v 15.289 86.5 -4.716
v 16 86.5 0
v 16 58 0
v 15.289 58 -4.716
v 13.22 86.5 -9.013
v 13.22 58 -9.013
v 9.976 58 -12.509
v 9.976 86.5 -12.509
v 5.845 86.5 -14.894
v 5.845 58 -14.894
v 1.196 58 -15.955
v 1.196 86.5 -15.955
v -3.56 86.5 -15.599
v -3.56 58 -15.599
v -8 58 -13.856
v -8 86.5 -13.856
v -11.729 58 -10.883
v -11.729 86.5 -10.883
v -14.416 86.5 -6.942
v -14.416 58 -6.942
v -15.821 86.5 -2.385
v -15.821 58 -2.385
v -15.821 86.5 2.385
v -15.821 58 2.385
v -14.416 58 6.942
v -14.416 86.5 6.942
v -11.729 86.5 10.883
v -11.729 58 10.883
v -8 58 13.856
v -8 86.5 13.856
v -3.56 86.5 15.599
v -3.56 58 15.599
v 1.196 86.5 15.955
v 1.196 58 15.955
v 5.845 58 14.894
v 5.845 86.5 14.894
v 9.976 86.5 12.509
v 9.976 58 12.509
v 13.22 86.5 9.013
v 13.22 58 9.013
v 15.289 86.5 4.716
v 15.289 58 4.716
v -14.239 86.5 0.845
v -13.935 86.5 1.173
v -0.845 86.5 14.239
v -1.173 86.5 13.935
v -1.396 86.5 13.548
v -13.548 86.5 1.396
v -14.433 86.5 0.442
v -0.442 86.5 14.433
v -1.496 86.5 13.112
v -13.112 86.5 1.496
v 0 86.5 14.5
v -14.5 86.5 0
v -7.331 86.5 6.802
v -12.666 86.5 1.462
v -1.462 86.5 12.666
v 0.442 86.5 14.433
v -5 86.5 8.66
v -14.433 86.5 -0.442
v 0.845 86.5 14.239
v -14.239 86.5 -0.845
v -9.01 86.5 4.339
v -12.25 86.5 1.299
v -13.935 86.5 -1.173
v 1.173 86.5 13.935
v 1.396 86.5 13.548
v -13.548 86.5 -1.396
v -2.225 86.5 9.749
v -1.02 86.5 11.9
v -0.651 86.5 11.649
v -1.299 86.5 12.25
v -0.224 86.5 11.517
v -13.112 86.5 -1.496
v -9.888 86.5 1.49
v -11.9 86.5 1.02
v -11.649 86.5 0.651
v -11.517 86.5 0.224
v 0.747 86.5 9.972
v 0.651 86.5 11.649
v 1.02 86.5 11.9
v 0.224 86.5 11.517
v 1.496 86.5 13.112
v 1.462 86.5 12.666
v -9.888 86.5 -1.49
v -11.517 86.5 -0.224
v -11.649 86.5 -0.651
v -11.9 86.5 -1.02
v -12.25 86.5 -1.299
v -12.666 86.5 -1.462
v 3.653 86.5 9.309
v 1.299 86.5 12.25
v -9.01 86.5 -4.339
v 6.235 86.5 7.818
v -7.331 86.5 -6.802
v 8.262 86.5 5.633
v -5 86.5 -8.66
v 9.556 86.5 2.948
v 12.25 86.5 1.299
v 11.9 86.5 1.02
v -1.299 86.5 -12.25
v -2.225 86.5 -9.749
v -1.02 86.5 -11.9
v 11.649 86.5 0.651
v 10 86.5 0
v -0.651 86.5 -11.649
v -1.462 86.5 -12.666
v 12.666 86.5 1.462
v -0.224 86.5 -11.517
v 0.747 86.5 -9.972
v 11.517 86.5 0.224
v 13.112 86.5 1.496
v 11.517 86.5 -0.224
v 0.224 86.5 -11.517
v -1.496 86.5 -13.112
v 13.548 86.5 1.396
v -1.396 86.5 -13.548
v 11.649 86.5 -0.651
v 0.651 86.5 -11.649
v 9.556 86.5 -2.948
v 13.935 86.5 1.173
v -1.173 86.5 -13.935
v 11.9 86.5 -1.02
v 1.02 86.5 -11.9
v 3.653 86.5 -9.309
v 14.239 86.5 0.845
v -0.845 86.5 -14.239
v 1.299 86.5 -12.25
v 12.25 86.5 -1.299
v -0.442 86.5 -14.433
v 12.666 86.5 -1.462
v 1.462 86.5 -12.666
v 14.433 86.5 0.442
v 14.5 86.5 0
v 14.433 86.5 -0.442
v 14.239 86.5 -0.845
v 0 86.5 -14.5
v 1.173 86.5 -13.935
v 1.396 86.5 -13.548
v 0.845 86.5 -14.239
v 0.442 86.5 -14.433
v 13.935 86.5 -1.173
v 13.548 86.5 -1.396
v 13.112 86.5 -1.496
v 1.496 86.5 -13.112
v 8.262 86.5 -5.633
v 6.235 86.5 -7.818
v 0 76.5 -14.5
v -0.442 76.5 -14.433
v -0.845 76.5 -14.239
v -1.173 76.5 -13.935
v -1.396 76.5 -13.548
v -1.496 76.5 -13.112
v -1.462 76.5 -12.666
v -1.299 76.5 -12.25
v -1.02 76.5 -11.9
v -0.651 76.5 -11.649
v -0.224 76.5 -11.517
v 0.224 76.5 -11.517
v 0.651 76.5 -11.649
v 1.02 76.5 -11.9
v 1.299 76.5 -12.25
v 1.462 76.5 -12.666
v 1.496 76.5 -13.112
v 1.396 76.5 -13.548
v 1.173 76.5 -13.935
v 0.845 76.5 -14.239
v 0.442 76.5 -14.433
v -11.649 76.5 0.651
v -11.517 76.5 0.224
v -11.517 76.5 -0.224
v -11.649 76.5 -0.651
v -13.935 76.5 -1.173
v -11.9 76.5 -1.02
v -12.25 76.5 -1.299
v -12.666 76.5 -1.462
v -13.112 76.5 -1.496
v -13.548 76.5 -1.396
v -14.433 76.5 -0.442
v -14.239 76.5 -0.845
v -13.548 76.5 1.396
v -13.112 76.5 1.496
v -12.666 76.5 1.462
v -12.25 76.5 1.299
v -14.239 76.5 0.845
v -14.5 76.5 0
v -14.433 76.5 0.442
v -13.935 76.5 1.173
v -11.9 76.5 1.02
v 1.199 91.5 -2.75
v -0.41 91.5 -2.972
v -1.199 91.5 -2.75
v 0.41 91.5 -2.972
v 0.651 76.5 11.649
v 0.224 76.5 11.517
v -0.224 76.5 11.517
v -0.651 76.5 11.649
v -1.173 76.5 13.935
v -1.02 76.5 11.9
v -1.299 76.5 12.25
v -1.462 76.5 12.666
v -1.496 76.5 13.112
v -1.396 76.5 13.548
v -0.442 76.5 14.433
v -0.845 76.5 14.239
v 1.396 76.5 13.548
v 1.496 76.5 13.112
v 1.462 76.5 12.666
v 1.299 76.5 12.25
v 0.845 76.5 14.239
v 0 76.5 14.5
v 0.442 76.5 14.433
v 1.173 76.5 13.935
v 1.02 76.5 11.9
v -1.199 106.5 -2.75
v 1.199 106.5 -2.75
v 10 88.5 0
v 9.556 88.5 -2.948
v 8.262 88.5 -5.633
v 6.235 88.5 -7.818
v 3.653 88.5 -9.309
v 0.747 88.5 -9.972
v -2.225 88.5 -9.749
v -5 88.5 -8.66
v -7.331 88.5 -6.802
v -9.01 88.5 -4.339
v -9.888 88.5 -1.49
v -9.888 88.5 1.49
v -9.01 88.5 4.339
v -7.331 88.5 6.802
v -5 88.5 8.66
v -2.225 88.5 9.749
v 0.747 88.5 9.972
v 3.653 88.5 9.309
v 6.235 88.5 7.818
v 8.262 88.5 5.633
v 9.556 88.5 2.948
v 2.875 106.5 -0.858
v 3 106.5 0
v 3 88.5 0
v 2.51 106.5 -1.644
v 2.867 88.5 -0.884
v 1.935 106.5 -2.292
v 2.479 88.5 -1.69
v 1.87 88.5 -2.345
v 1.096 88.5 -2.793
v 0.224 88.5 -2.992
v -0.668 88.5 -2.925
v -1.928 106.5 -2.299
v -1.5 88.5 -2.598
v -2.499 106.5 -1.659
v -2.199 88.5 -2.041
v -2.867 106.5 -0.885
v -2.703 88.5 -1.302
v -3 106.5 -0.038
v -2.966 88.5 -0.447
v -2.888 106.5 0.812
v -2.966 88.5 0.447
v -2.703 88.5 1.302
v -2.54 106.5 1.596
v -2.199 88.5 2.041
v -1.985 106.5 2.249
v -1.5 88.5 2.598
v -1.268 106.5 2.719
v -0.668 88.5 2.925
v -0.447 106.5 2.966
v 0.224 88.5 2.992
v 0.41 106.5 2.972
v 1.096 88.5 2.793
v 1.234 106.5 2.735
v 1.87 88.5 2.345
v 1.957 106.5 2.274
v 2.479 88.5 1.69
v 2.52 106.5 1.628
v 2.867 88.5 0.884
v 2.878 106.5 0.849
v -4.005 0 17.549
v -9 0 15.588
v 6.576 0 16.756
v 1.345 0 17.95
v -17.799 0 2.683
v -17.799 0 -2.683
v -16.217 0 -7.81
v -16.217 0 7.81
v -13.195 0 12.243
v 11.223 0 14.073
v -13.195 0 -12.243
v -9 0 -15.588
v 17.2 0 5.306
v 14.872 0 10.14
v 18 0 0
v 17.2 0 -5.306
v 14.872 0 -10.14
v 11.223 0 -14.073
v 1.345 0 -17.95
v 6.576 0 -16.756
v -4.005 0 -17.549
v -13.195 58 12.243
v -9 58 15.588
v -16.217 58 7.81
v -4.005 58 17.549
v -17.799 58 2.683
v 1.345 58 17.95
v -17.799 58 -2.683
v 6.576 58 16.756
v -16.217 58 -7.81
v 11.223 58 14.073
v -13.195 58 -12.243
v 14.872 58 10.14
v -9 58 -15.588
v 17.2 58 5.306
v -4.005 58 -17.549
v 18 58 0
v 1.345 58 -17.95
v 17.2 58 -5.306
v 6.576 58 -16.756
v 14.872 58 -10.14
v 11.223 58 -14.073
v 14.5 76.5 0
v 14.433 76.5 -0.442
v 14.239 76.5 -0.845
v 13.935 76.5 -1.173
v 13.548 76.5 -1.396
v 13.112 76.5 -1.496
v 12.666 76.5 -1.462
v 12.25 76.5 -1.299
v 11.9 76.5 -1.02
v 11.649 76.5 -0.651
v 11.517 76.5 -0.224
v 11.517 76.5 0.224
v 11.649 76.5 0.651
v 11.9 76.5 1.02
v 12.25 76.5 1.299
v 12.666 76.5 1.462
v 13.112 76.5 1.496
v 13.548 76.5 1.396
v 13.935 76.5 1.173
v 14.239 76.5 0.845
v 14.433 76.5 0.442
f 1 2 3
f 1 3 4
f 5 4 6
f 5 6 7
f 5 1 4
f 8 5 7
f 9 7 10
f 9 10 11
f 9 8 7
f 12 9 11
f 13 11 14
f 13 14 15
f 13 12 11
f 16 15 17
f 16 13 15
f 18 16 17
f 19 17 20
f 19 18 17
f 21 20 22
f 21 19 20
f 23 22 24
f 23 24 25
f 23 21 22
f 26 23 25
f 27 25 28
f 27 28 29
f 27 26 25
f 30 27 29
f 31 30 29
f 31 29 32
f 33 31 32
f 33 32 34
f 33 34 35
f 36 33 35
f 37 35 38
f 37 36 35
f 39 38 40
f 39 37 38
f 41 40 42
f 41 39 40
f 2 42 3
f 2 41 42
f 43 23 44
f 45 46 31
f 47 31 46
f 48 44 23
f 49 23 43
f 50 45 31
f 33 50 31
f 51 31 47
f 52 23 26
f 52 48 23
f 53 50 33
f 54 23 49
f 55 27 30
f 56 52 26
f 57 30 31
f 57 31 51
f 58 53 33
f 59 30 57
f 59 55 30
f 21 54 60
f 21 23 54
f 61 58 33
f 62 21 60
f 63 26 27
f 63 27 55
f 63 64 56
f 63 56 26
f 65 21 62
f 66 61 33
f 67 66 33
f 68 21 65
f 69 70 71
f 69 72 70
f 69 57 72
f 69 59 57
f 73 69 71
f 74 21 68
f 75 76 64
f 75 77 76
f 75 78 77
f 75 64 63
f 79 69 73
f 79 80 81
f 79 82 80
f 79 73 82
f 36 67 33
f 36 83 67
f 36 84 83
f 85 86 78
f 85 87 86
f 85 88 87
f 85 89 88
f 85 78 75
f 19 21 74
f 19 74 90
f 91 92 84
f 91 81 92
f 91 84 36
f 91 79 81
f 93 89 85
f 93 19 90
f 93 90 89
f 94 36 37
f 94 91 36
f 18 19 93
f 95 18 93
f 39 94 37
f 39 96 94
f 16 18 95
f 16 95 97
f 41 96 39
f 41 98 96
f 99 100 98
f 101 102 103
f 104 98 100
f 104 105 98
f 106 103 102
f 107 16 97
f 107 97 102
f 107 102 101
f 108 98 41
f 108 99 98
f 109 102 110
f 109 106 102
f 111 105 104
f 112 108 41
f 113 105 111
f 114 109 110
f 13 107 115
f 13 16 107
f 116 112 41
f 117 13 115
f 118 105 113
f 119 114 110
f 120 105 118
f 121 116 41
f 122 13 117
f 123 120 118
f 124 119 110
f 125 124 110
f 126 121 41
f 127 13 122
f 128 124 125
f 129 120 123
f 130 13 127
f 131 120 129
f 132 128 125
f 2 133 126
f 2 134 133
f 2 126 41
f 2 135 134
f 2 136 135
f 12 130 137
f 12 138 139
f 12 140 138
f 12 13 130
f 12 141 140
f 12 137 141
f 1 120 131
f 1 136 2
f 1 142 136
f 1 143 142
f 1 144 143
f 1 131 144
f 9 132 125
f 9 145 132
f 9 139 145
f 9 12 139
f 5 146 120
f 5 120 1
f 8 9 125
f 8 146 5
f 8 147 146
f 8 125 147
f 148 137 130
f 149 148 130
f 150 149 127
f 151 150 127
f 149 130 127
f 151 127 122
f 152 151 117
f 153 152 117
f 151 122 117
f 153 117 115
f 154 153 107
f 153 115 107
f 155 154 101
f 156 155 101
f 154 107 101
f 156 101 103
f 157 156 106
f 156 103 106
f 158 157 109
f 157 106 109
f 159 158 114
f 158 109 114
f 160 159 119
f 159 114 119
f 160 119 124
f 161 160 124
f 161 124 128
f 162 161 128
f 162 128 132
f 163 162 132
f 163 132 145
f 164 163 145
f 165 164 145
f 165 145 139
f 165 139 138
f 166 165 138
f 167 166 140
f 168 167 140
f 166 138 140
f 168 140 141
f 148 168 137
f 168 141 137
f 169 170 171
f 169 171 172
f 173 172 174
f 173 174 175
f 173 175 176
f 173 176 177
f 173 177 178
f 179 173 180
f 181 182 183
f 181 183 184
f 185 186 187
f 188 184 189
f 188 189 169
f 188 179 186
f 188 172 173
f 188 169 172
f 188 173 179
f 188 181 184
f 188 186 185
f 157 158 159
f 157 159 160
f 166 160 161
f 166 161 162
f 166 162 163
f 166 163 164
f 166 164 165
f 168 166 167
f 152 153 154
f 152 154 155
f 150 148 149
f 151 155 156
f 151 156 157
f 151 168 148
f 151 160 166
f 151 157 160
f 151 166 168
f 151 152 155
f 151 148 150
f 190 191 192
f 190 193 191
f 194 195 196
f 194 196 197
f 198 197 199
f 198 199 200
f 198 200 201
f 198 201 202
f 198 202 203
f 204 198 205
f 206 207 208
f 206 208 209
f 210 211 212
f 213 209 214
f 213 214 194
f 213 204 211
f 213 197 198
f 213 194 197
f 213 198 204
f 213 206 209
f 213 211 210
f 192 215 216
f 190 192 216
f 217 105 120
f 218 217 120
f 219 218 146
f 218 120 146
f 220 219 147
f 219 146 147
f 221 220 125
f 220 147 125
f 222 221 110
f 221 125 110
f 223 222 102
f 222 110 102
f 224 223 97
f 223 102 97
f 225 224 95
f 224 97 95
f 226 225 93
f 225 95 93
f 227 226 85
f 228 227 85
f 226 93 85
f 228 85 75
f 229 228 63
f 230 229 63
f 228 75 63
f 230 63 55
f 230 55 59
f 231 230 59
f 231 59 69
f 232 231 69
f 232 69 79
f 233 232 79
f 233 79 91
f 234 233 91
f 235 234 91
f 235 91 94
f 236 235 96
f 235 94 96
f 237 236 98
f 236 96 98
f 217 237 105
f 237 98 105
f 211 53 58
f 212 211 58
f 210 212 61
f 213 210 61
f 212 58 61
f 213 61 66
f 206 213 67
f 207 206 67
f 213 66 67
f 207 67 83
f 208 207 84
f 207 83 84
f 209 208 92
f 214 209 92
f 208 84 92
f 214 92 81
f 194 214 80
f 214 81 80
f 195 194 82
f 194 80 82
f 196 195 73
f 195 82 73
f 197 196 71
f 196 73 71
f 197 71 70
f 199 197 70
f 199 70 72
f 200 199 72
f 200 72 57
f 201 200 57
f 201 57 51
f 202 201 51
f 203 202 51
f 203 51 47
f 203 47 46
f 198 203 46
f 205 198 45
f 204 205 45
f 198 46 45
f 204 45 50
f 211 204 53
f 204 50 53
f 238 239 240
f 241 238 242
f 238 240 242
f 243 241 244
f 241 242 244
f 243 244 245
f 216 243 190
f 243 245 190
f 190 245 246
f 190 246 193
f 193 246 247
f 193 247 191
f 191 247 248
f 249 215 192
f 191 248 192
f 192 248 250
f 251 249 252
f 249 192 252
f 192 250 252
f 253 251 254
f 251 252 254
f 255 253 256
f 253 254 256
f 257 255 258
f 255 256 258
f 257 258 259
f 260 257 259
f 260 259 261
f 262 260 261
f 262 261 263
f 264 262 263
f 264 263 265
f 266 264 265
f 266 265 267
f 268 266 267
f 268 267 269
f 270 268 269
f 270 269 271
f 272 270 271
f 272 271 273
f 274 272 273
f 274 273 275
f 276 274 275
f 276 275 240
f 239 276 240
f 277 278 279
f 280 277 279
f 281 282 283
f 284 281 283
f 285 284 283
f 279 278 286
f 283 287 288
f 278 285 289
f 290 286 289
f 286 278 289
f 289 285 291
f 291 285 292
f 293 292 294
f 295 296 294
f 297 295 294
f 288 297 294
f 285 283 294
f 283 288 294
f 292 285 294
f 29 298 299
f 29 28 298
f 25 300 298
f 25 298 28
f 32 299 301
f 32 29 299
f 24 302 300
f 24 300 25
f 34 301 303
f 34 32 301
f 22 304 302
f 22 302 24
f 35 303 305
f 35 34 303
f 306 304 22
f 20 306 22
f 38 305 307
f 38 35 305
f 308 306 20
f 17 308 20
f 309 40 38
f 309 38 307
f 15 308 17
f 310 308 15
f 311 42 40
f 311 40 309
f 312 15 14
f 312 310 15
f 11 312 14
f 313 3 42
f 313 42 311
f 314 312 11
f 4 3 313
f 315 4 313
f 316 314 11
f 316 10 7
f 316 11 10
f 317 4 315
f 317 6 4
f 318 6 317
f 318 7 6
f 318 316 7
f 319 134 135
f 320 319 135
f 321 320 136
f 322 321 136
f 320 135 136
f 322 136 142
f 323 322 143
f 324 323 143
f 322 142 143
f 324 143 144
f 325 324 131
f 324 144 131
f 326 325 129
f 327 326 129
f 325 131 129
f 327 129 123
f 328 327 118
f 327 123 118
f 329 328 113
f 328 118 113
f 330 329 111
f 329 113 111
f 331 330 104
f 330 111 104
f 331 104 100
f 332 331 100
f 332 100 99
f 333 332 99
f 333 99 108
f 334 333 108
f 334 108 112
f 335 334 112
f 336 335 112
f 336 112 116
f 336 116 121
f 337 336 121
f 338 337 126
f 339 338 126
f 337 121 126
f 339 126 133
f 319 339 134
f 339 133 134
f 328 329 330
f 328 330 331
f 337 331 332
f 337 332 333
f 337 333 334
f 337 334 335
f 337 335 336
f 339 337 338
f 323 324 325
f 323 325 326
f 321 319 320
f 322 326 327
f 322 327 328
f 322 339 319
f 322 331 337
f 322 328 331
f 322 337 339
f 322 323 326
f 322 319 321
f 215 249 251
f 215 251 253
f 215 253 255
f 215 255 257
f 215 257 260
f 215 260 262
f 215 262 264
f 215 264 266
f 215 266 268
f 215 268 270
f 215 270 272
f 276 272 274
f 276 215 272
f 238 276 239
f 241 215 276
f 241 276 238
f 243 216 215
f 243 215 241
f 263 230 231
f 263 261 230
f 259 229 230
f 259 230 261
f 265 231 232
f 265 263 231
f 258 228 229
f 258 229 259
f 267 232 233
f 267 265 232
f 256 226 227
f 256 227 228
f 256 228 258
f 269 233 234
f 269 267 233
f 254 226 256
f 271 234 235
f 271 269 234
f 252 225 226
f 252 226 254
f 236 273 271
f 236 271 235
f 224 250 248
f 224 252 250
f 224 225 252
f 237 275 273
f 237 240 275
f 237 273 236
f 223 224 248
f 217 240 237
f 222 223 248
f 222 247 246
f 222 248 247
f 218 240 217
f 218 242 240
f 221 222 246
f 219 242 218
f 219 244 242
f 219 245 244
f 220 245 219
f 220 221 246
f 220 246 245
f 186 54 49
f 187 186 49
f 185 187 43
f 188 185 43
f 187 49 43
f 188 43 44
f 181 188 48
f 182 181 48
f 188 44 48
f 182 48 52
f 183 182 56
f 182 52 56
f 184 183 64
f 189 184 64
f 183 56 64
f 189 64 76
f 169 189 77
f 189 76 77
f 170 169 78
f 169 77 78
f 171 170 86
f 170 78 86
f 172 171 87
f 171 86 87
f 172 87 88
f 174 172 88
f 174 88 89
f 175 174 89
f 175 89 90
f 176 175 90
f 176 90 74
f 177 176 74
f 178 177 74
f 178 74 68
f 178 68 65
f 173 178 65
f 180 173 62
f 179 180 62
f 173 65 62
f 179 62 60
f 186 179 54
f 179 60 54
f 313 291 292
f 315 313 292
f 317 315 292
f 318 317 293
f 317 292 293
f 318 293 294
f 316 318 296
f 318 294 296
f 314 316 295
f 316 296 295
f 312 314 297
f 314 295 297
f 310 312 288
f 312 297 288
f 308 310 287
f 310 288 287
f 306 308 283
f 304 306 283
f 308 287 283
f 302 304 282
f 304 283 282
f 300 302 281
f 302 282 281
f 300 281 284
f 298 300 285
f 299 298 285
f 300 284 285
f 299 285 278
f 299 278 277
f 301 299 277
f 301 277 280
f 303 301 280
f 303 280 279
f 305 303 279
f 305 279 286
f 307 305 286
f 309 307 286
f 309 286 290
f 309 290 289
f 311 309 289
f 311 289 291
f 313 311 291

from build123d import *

# Parameters (mm, degrees)
ESQUISSE1_R                  = 18
BOSS_EXTRU_1_DEPTH           = 86.5
ESQUISSE2_R                  = 10
BOSS_EXTRU_2_DEPTH           = 2
ESQUISSE3_R                  = 3
BOSS_EXTRU_3_DEPTH           = 18
ENL_V_START                  = -15
ENL_V_MAT_EXTRU_1_DEPTH      = 15
ESQUISSE6_R                  = 1.5
ENL_V_MAT_EXTRU_2_DEPTH      = 10
R_P_TITION_CIRCULAIRE1_COUNT = 4
ENL_V_START_2                = -28.5
ESQUISSE7_R                  = 18
ESQUISSE7_R_2                = 16
ENL_V_MAT_EXTRU_3_DEPTH      = 28.5


with BuildPart() as part:
    # Esquisse1 → Boss.-Extru.1 (new body)
    with BuildSketch(Plane(origin=(0, 0, 0), x_dir=(1, 0, 0), z_dir=(0, 1, 0))):
        Circle(ESQUISSE1_R)
    extrude(amount=BOSS_EXTRU_1_DEPTH)

    # Esquisse2 → Boss.-Extru.2 (add)
    with BuildSketch(Plane(origin=(0, 86.5, 0), x_dir=(1, 0, 0), z_dir=(0, 1, 0))):
        Circle(ESQUISSE2_R)
    extrude(amount=BOSS_EXTRU_2_DEPTH)

    # Esquisse3 → Boss.-Extru.3 (add)
    with BuildSketch(Plane(origin=(0, 88.5, 0), x_dir=(1, 0, 0), z_dir=(0, 1, 0))):
        Circle(ESQUISSE3_R)
    extrude(amount=BOSS_EXTRU_3_DEPTH)

    # Esquisse4 → Enlèv. mat.-Extru.1 (cut)
    with BuildSketch(Plane(origin=(0, 106.5, 0), x_dir=(1, 0, 0), z_dir=(0, 1, 0)).offset(ENL_V_START)):
        with BuildLine():
            ThreePointArc((1.198957881, 2.75), (0, 3), (-1.198957881, 2.75))
            Line((-1.198957881, 2.75), (0, 2.75))
            Line((0, 2.75), (1.198957881, 2.75))
        make_face()
    extrude(amount=ENL_V_MAT_EXTRU_1_DEPTH, mode=Mode.SUBTRACT)

    # Esquisse6 → Enlèv. mat.-Extru.2 (cut)
    with BuildSketch(Plane(origin=(0, 86.5, 0), x_dir=(1, 0, 0), z_dir=(0, 1, 0))):
        with Locations((13, 0)):
            Circle(ESQUISSE6_R)
    enl_v_mat_extru_2 = extrude(amount=-ENL_V_MAT_EXTRU_2_DEPTH, mode=Mode.SUBTRACT)

    # Répétition circulaire1: Enlèv. mat.-Extru.2 ×4 about axis
    r_p_tition_circulaire1_axis = Axis((0, -10.575, 0), (0, 1, 0))
    for i in range(1, R_P_TITION_CIRCULAIRE1_COUNT):
        add(enl_v_mat_extru_2.rotate(r_p_tition_circulaire1_axis, i * 360 / R_P_TITION_CIRCULAIRE1_COUNT), mode=Mode.SUBTRACT)

    # Esquisse7 → Enlèv. mat.-Extru.3 (cut)
    with BuildSketch(Plane(origin=(0, 86.5, 0), x_dir=(1, 0, 0), z_dir=(0, 1, 0)).offset(ENL_V_START_2)):
        Circle(ESQUISSE7_R)
        Circle(ESQUISSE7_R_2, mode=Mode.SUBTRACT)
    extrude(amount=ENL_V_MAT_EXTRU_3_DEPTH, mode=Mode.SUBTRACT)


solid = part.part
